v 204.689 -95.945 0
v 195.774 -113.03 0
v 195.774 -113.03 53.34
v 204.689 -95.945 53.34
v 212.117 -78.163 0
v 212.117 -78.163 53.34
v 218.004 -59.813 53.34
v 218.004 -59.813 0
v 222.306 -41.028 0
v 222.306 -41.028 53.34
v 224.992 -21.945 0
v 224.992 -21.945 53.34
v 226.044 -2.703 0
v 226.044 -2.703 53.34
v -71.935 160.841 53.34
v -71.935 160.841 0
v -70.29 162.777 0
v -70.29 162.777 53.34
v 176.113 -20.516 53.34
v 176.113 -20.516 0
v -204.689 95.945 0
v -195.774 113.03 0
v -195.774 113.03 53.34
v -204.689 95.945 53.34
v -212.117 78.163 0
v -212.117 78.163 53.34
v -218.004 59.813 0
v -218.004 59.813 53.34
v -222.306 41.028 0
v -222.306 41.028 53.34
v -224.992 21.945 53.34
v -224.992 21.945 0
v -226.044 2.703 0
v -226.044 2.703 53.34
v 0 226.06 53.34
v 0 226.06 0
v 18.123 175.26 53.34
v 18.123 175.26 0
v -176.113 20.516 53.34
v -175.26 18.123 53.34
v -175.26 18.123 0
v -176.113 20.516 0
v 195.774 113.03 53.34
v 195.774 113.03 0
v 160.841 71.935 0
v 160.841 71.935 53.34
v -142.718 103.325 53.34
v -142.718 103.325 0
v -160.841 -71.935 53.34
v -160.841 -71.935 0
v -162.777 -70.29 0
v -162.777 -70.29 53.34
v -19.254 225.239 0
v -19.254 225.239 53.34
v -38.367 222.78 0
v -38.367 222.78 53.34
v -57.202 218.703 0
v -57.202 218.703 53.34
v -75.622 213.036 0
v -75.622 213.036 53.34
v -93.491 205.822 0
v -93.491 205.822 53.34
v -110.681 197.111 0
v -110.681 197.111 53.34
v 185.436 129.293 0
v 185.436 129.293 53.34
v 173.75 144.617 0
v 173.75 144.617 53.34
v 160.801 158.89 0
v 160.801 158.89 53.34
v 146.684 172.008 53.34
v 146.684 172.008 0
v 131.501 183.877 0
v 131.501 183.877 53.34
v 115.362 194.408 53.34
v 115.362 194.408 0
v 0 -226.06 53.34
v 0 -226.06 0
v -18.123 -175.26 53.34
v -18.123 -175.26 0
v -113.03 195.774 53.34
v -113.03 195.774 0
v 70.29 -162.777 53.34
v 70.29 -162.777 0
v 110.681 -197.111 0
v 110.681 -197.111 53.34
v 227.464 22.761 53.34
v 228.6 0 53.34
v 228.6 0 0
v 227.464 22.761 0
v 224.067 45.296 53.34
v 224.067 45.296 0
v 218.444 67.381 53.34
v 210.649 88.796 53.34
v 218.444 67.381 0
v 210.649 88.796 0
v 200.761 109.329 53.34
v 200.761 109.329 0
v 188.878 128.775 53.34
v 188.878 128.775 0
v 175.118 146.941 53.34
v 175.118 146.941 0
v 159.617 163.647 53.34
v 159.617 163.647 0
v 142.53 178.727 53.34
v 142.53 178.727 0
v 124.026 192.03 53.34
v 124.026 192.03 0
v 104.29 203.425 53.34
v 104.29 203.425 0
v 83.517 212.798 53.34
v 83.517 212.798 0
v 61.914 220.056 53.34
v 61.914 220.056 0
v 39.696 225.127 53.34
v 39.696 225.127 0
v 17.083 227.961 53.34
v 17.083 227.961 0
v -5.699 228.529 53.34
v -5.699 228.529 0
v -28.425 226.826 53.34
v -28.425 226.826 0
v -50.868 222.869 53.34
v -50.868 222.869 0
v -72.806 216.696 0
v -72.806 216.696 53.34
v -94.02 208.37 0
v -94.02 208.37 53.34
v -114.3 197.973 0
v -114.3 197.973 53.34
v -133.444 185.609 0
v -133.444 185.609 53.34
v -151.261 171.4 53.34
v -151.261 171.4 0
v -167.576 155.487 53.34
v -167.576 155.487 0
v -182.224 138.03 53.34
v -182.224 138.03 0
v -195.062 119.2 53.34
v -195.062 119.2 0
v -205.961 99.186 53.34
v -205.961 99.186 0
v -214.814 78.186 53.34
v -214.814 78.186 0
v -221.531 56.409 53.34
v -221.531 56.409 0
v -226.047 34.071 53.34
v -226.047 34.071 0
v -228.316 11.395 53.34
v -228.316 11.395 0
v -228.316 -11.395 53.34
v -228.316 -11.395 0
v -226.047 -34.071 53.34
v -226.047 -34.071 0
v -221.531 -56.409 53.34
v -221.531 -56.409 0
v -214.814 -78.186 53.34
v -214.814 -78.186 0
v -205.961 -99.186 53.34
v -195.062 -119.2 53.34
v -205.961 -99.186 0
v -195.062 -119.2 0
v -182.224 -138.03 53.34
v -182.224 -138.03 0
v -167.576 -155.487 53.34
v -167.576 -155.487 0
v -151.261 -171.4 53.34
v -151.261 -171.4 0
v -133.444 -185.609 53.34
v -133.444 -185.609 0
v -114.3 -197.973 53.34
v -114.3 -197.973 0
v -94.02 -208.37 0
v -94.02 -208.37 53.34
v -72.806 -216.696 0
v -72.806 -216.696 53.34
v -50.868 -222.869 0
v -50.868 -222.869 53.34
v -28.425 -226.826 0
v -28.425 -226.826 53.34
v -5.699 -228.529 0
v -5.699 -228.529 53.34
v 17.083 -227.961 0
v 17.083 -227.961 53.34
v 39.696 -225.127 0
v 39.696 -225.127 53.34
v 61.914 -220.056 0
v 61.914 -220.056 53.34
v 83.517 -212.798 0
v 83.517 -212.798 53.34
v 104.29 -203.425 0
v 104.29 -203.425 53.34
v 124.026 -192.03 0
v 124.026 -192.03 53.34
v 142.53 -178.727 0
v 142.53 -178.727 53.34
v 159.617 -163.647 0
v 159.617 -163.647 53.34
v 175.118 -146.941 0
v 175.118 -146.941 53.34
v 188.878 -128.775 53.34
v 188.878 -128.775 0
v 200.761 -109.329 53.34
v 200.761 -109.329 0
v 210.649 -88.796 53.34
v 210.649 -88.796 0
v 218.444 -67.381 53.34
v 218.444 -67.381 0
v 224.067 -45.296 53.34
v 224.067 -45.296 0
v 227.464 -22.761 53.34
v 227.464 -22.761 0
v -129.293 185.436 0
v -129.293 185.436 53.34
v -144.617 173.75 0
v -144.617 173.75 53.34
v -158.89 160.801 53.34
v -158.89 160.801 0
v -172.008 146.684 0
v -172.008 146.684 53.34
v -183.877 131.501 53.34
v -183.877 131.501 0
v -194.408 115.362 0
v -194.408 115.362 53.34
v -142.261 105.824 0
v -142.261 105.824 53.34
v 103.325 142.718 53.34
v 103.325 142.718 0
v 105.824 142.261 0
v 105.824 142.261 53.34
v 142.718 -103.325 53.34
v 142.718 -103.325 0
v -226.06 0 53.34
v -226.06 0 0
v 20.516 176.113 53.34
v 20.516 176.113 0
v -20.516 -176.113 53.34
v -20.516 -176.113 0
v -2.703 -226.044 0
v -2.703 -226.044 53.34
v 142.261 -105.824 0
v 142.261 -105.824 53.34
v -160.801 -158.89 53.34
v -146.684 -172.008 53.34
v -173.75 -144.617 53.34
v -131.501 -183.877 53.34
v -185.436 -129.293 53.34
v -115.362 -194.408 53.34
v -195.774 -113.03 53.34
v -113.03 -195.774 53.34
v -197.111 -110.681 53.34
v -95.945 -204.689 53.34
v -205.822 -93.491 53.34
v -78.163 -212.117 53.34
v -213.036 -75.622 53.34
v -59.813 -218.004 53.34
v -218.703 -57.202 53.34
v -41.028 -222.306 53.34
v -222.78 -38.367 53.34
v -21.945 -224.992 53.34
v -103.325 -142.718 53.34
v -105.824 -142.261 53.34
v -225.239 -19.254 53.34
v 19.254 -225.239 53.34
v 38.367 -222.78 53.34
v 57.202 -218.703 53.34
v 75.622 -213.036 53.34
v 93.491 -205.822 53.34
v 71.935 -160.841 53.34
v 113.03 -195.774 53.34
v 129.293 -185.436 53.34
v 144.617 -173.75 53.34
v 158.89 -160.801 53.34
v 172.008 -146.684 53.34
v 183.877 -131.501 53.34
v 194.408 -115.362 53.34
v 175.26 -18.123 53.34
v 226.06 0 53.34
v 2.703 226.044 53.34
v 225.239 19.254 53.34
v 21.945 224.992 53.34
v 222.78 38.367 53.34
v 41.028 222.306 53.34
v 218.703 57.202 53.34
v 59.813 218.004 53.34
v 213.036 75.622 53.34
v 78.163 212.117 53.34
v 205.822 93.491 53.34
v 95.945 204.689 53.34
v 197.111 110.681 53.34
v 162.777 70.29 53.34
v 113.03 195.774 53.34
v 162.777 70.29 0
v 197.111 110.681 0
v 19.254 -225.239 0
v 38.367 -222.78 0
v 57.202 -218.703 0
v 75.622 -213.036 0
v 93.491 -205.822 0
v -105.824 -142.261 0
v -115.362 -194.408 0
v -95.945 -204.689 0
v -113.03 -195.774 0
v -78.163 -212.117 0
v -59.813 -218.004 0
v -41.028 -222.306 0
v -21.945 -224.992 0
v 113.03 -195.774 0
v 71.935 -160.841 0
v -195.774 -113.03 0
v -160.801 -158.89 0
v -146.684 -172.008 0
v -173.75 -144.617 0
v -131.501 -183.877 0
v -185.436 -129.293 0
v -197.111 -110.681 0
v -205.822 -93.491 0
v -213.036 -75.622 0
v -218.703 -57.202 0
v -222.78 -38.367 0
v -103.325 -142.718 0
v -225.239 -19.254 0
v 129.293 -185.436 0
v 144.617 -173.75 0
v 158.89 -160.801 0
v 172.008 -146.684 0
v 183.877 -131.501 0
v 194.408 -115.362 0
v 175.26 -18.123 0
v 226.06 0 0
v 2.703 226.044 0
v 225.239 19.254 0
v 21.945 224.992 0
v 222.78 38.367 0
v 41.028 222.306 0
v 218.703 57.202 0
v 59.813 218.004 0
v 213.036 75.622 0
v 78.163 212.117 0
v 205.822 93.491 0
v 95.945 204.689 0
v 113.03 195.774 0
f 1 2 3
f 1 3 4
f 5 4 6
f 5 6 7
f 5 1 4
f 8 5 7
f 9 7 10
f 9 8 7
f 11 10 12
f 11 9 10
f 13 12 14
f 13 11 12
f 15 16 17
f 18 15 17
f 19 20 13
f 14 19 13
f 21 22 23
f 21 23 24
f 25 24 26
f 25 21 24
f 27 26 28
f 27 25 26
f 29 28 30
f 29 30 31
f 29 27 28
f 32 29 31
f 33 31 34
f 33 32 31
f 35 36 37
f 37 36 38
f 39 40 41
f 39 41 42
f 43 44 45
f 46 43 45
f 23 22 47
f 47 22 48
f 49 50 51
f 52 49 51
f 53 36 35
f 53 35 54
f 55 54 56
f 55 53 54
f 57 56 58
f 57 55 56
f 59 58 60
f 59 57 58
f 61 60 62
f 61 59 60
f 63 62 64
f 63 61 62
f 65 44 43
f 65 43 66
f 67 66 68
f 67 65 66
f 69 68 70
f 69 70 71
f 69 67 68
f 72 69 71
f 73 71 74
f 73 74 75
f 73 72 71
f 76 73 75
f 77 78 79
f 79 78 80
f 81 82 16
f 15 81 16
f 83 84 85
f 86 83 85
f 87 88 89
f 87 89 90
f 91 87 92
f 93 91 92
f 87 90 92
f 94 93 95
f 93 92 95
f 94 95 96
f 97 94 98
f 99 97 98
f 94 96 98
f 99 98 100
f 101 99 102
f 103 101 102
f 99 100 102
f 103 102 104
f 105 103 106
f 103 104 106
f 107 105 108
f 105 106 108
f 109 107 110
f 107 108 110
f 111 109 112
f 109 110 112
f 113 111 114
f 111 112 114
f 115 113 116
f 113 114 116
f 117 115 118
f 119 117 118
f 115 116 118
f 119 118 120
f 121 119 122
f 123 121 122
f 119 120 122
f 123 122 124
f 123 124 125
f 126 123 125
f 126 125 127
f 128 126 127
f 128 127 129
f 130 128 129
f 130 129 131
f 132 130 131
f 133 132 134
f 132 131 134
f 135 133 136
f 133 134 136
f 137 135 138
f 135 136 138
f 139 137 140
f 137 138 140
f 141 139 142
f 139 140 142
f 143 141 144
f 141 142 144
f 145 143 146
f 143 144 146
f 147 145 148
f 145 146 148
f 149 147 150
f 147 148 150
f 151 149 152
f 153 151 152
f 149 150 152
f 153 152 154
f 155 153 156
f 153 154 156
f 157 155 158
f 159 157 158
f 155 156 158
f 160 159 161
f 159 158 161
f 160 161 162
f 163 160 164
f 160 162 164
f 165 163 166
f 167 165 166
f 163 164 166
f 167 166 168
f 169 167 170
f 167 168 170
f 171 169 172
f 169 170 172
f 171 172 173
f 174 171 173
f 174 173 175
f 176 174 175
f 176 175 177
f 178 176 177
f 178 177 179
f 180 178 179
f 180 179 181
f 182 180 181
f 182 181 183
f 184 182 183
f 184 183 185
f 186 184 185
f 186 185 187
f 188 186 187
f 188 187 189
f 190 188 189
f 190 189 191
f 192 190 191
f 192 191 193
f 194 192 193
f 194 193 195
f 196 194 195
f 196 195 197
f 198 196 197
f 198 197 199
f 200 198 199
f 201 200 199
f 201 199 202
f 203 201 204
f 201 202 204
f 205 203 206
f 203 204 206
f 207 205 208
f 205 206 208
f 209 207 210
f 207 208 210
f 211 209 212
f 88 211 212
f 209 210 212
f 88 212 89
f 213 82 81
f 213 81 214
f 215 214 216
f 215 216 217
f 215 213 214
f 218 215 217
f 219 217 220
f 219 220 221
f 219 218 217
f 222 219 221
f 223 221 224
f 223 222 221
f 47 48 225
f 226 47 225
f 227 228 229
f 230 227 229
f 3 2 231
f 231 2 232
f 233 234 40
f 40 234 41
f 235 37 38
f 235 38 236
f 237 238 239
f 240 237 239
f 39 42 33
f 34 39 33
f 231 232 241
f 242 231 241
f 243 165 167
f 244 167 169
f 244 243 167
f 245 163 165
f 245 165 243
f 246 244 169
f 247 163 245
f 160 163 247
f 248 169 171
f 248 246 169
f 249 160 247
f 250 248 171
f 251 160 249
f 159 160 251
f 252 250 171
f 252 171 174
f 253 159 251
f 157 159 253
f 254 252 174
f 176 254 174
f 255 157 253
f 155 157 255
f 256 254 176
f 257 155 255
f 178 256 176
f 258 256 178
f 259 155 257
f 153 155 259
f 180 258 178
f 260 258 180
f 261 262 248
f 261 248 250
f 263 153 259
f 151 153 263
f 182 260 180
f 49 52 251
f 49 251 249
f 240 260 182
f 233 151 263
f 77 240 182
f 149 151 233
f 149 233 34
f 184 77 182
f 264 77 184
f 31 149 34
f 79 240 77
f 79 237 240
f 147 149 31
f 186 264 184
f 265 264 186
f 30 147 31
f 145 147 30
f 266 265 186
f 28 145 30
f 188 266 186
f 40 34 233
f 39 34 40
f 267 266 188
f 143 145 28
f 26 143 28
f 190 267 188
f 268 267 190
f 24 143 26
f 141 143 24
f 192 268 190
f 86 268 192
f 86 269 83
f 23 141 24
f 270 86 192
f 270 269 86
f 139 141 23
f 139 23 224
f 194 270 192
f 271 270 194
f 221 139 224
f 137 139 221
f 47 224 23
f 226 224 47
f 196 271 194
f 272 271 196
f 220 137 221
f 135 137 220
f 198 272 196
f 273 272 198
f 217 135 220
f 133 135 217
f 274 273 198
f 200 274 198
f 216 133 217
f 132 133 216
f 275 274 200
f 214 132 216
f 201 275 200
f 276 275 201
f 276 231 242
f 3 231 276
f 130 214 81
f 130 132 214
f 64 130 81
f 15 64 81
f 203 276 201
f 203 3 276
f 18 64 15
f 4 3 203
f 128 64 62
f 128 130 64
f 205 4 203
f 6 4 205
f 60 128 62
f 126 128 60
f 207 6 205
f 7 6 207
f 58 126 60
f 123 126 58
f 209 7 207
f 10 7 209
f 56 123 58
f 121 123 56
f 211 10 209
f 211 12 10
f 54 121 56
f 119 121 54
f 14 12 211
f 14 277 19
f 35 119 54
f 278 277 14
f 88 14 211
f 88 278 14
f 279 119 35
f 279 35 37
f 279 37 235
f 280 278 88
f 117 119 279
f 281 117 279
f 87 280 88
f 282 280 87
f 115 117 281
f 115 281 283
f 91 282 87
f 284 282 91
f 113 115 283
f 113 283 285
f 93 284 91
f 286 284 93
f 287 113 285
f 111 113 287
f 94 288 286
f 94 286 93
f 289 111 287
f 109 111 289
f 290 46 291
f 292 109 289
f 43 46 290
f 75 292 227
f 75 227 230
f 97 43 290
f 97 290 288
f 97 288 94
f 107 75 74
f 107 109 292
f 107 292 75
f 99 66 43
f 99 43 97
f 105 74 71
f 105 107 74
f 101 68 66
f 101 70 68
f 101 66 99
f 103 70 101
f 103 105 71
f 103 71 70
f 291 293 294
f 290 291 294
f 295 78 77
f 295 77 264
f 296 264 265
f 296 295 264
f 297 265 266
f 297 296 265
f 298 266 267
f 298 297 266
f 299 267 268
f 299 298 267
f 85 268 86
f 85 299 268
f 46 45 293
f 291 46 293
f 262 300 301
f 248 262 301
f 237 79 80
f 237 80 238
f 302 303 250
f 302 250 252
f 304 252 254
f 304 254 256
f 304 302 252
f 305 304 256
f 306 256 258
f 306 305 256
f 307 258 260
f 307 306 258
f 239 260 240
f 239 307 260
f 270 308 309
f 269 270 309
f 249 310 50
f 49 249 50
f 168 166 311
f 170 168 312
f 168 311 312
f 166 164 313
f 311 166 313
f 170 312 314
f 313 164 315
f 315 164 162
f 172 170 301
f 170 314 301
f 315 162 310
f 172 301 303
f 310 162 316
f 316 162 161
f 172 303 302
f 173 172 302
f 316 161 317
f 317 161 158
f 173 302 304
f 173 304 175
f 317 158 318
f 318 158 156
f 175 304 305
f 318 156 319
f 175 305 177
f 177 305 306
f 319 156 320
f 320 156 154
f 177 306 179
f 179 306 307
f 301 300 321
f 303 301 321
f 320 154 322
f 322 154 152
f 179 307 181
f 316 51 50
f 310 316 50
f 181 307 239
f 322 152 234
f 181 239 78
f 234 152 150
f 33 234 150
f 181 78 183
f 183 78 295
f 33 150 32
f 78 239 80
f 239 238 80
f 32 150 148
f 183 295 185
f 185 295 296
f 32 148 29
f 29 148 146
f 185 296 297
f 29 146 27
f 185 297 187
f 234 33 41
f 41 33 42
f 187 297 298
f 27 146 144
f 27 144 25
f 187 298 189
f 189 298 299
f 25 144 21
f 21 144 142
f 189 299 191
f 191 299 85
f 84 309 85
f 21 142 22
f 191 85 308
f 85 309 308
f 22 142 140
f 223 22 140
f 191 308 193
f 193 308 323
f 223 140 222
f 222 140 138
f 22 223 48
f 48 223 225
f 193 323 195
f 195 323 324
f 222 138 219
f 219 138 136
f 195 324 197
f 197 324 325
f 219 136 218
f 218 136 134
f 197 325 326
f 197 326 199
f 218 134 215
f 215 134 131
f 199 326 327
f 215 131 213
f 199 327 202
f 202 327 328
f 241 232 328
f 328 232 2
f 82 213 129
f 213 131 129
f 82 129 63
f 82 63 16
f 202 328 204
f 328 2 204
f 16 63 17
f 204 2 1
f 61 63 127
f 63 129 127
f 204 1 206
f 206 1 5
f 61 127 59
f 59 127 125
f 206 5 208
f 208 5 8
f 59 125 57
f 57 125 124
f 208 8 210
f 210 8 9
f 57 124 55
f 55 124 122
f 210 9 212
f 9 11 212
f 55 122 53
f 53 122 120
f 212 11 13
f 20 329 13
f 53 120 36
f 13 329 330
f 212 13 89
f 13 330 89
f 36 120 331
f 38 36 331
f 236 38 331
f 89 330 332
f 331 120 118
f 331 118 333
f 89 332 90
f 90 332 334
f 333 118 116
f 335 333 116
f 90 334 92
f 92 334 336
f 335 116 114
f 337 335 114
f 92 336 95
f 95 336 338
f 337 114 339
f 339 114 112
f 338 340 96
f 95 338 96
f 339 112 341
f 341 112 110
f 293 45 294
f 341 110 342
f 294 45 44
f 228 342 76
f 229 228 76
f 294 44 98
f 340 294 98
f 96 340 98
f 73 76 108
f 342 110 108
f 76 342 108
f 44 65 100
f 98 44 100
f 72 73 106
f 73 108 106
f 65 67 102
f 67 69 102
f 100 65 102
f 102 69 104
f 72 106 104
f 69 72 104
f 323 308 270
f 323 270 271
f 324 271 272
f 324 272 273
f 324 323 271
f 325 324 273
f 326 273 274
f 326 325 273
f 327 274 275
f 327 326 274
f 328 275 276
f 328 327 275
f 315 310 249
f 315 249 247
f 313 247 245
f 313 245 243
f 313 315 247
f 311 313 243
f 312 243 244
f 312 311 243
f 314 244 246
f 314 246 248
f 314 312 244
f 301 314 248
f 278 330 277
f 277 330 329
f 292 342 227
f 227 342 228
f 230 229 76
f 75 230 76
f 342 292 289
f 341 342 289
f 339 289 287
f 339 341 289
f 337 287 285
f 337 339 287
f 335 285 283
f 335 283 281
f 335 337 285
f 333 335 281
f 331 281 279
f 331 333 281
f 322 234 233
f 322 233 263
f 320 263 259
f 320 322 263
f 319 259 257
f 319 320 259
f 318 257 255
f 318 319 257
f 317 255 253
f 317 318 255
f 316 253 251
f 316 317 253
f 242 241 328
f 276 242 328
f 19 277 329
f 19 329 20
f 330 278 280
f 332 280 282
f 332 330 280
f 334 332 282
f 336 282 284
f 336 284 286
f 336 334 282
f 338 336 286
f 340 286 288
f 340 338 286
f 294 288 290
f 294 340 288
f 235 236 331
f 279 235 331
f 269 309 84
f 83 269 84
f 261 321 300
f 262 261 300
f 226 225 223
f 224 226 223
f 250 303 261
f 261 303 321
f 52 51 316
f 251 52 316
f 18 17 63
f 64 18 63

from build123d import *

# Parameters (mm, degrees)
SKETCH1_R           = 228.6
SKETCH1_R_2         = 226.06
BOSS_EXTRUDE1_DEPTH = 53.34
BOSS_EXTRUDE2_START = -53.34
BOSS_EXTRUDE2_DEPTH = 53.34


with BuildPart() as part:
    # Sketch1 → Boss-Extrude1 (new body)
    with BuildSketch(Plane.XY):
        Circle(SKETCH1_R)
        Circle(SKETCH1_R_2, mode=Mode.SUBTRACT)
    extrude(amount=BOSS_EXTRUDE1_DEPTH)

    # Sketch2 → Boss-Extrude2 (add)
    with BuildSketch(Plane.XY.offset(53.34).offset(BOSS_EXTRUDE2_START)):
        with BuildLine():
            Line((-226.06, 0), (-175.26, 18.123220102))
            Line((-175.26, 18.123220102), (-176.113474245, 20.515537328))
            Line((-176.113474245, 20.515537328), (-226.043844758, 2.702563026))
            ThreePointArc((-226.043844758, 2.702563026), (-226.055961153, 1.351305656), (-226.06, 0))
        make_face()
        with BuildLine():
            Line((-195.77370278, 113.03), (-142.718002216, 103.325169006))
            Line((-142.718002216, 103.325169006), (-142.260973981, 105.823713621))
            Line((-142.260973981, 105.823713621), (-194.408430417, 115.362410615))
            ThreePointArc((-194.408430417, 115.362410615), (-195.094552208, 114.198245603), (-195.77370278, 113.03))
        make_face()
        with BuildLine():
            Line((-113.03, 195.77370278), (-71.934830994, 160.841222318))
            Line((-71.934830994, 160.841222318), (-70.289760624, 162.776511309))
            Line((-70.289760624, 162.776511309), (-110.681434143, 197.110993443))
            ThreePointArc((-110.681434143, 197.110993443), (-111.857715551, 196.445857864), (-113.03, 195.77370278))
        make_face()
        with BuildLine():
            Line((0, 226.06), (18.123220102, 175.26))
            Line((18.123220102, 175.26), (20.515537328, 176.113474245))
            Line((20.515537328, 176.113474245), (2.702563026, 226.043844758))
            ThreePointArc((2.702563026, 226.043844758), (1.351305656, 226.055961153), (0, 226.06))
        make_face()
        with BuildLine():
            Line((113.03, 195.77370278), (103.325169006, 142.718002216))
            Line((103.325169006, 142.718002216), (105.823713621, 142.260973981))
            Line((105.823713621, 142.260973981), (115.362410615, 194.408430417))
            ThreePointArc((115.362410615, 194.408430417), (114.198245603, 195.094552208), (113.03, 195.77370278))
        make_face()
        with BuildLine():
            Line((195.77370278, 113.03), (160.841222318, 71.934830994))
            Line((160.841222318, 71.934830994), (162.776511309, 70.289760624))
            Line((162.776511309, 70.289760624), (197.110993443, 110.681434143))
            ThreePointArc((197.110993443, 110.681434143), (196.445857864, 111.857715551), (195.77370278, 113.03))
        make_face()
        with BuildLine():
            Line((226.06, 0), (175.26, -18.123220102))
            Line((175.26, -18.123220102), (176.113474245, -20.515537328))
            Line((176.113474245, -20.515537328), (226.043844758, -2.702563026))
            ThreePointArc((226.043844758, -2.702563026), (226.055961153, -1.351305656), (226.06, 0))
        make_face()
        with BuildLine():
            Line((195.77370278, -113.03), (142.718002216, -103.325169006))
            Line((142.718002216, -103.325169006), (142.260973981, -105.823713621))
            Line((142.260973981, -105.823713621), (194.408430417, -115.362410615))
            ThreePointArc((194.408430417, -115.362410615), (195.094552208, -114.198245603), (195.77370278, -113.03))
        make_face()
        with BuildLine():
            Line((113.03, -195.77370278), (71.934830994, -160.841222318))
            Line((71.934830994, -160.841222318), (70.289760624, -162.776511309))
            Line((70.289760624, -162.776511309), (110.681434143, -197.110993443))
            ThreePointArc((110.681434143, -197.110993443), (111.857715551, -196.445857864), (113.03, -195.77370278))
        make_face()
        with BuildLine():
            Line((0, -226.06), (-18.123220102, -175.26))
            Line((-18.123220102, -175.26), (-20.515537328, -176.113474245))
            Line((-20.515537328, -176.113474245), (-2.702563026, -226.043844758))
            ThreePointArc((-2.702563026, -226.043844758), (-1.351305656, -226.055961153), (0, -226.06))
        make_face()
        with BuildLine():
            Line((-113.03, -195.77370278), (-103.325169006, -142.718002216))
            Line((-103.325169006, -142.718002216), (-105.823713621, -142.260973981))
            Line((-105.823713621, -142.260973981), (-115.362410615, -194.408430417))
            ThreePointArc((-115.362410615, -194.408430417), (-114.198245603, -195.094552208), (-113.03, -195.77370278))
        make_face()
        with BuildLine():
            Line((-195.77370278, -113.03), (-160.841222318, -71.934830994))
            Line((-160.841222318, -71.934830994), (-162.776511309, -70.289760624))
            Line((-162.776511309, -70.289760624), (-197.110993443, -110.681434143))
            ThreePointArc((-197.110993443, -110.681434143), (-196.445857864, -111.857715551), (-195.77370278, -113.03))
        make_face()
    extrude(amount=BOSS_EXTRUDE2_DEPTH)


solid = part.part
